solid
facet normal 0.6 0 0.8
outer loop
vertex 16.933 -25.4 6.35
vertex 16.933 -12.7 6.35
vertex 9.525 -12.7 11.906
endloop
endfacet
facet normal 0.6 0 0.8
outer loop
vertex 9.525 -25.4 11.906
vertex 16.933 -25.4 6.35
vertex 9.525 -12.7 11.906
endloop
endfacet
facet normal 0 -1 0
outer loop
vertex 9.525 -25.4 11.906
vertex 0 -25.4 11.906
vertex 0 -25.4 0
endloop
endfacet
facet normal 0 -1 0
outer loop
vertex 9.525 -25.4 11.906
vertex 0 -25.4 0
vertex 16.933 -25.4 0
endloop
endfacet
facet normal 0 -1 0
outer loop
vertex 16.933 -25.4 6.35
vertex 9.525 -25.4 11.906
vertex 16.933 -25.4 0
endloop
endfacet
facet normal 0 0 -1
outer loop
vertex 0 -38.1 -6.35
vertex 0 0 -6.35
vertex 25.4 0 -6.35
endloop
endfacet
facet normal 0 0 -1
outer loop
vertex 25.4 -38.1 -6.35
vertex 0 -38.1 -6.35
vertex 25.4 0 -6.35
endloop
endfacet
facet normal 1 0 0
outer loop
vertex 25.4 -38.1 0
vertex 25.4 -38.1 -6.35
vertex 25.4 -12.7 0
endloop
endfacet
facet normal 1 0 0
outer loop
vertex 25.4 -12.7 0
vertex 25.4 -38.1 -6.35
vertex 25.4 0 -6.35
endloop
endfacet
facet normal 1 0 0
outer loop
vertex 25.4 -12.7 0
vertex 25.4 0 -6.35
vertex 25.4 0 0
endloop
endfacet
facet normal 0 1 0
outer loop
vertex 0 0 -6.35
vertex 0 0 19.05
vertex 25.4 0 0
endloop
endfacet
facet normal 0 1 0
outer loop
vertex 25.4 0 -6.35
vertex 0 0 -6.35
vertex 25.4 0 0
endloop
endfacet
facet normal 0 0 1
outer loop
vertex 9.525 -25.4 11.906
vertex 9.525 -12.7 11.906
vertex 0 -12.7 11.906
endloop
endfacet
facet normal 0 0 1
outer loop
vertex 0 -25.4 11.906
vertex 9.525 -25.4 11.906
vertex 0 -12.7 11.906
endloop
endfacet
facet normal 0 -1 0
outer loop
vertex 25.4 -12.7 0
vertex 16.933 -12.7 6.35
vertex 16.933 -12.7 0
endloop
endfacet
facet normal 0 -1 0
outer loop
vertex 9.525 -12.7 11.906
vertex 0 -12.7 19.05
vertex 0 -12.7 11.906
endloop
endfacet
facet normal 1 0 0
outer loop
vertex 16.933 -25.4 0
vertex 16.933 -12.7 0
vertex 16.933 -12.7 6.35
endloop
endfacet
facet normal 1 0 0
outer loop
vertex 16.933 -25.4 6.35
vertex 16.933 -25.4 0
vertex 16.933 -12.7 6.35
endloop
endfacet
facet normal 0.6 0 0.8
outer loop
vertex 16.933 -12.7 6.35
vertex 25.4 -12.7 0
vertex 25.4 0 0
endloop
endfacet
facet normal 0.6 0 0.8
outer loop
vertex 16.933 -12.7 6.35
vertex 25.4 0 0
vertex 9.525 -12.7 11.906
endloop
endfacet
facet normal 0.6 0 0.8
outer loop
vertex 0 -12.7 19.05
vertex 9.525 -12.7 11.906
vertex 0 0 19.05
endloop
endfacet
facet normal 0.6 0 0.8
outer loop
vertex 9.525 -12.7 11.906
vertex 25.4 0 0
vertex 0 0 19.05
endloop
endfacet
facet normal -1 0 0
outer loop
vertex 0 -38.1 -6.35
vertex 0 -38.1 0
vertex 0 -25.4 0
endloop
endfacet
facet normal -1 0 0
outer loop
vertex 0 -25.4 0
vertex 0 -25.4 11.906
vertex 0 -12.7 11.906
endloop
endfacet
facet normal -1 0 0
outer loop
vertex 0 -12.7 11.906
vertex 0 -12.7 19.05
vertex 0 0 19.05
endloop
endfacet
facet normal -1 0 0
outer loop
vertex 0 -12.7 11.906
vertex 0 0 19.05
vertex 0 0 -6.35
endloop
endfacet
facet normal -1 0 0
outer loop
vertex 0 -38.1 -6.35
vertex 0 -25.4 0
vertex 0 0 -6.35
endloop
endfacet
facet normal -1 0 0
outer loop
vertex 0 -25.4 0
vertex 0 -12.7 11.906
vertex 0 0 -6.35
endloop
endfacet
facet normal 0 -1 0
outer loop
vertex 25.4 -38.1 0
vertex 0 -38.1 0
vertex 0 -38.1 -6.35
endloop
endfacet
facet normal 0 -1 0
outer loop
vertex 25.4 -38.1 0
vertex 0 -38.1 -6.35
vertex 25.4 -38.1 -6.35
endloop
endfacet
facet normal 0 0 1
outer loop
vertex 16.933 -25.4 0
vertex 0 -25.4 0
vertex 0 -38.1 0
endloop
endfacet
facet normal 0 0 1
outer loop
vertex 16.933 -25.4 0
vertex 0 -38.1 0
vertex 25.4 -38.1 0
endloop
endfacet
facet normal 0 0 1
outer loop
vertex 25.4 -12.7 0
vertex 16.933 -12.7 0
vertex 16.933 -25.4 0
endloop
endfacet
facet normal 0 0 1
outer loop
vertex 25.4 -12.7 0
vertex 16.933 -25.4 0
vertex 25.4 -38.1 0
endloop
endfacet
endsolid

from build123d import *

# Parameters (mm, degrees)
F0_W     = 25.4
F0_H     = 6.35
F1_DEPTH = 38.1
F2_DEPTH = 12.7
F4_DEPTH = 12.7


with BuildPart() as f1:
    # F0 (on Front) → F1 (new body)
    with BuildSketch(Plane.XZ):
        with Locations((12.7, -3.175)):
            Rectangle(F0_W, F0_H)
    extrude(amount=F1_DEPTH)

    # F0 (on Front) → F2 (join)
    with BuildSketch(Plane.XZ):
        Polygon((0, 19.05), (0, 0), (25.4, 0), align=None)
    extrude(amount=F2_DEPTH)

    # F3 (on face) → F4 (join)
    with BuildSketch(Plane.XZ.offset(12.7)):
        Polygon((0, 11.90625), (0, 0), (16.933333, 0), (16.933333, 6.35), (9.525, 11.90625), align=None)
    extrude(amount=F4_DEPTH)


solid = f1.part
